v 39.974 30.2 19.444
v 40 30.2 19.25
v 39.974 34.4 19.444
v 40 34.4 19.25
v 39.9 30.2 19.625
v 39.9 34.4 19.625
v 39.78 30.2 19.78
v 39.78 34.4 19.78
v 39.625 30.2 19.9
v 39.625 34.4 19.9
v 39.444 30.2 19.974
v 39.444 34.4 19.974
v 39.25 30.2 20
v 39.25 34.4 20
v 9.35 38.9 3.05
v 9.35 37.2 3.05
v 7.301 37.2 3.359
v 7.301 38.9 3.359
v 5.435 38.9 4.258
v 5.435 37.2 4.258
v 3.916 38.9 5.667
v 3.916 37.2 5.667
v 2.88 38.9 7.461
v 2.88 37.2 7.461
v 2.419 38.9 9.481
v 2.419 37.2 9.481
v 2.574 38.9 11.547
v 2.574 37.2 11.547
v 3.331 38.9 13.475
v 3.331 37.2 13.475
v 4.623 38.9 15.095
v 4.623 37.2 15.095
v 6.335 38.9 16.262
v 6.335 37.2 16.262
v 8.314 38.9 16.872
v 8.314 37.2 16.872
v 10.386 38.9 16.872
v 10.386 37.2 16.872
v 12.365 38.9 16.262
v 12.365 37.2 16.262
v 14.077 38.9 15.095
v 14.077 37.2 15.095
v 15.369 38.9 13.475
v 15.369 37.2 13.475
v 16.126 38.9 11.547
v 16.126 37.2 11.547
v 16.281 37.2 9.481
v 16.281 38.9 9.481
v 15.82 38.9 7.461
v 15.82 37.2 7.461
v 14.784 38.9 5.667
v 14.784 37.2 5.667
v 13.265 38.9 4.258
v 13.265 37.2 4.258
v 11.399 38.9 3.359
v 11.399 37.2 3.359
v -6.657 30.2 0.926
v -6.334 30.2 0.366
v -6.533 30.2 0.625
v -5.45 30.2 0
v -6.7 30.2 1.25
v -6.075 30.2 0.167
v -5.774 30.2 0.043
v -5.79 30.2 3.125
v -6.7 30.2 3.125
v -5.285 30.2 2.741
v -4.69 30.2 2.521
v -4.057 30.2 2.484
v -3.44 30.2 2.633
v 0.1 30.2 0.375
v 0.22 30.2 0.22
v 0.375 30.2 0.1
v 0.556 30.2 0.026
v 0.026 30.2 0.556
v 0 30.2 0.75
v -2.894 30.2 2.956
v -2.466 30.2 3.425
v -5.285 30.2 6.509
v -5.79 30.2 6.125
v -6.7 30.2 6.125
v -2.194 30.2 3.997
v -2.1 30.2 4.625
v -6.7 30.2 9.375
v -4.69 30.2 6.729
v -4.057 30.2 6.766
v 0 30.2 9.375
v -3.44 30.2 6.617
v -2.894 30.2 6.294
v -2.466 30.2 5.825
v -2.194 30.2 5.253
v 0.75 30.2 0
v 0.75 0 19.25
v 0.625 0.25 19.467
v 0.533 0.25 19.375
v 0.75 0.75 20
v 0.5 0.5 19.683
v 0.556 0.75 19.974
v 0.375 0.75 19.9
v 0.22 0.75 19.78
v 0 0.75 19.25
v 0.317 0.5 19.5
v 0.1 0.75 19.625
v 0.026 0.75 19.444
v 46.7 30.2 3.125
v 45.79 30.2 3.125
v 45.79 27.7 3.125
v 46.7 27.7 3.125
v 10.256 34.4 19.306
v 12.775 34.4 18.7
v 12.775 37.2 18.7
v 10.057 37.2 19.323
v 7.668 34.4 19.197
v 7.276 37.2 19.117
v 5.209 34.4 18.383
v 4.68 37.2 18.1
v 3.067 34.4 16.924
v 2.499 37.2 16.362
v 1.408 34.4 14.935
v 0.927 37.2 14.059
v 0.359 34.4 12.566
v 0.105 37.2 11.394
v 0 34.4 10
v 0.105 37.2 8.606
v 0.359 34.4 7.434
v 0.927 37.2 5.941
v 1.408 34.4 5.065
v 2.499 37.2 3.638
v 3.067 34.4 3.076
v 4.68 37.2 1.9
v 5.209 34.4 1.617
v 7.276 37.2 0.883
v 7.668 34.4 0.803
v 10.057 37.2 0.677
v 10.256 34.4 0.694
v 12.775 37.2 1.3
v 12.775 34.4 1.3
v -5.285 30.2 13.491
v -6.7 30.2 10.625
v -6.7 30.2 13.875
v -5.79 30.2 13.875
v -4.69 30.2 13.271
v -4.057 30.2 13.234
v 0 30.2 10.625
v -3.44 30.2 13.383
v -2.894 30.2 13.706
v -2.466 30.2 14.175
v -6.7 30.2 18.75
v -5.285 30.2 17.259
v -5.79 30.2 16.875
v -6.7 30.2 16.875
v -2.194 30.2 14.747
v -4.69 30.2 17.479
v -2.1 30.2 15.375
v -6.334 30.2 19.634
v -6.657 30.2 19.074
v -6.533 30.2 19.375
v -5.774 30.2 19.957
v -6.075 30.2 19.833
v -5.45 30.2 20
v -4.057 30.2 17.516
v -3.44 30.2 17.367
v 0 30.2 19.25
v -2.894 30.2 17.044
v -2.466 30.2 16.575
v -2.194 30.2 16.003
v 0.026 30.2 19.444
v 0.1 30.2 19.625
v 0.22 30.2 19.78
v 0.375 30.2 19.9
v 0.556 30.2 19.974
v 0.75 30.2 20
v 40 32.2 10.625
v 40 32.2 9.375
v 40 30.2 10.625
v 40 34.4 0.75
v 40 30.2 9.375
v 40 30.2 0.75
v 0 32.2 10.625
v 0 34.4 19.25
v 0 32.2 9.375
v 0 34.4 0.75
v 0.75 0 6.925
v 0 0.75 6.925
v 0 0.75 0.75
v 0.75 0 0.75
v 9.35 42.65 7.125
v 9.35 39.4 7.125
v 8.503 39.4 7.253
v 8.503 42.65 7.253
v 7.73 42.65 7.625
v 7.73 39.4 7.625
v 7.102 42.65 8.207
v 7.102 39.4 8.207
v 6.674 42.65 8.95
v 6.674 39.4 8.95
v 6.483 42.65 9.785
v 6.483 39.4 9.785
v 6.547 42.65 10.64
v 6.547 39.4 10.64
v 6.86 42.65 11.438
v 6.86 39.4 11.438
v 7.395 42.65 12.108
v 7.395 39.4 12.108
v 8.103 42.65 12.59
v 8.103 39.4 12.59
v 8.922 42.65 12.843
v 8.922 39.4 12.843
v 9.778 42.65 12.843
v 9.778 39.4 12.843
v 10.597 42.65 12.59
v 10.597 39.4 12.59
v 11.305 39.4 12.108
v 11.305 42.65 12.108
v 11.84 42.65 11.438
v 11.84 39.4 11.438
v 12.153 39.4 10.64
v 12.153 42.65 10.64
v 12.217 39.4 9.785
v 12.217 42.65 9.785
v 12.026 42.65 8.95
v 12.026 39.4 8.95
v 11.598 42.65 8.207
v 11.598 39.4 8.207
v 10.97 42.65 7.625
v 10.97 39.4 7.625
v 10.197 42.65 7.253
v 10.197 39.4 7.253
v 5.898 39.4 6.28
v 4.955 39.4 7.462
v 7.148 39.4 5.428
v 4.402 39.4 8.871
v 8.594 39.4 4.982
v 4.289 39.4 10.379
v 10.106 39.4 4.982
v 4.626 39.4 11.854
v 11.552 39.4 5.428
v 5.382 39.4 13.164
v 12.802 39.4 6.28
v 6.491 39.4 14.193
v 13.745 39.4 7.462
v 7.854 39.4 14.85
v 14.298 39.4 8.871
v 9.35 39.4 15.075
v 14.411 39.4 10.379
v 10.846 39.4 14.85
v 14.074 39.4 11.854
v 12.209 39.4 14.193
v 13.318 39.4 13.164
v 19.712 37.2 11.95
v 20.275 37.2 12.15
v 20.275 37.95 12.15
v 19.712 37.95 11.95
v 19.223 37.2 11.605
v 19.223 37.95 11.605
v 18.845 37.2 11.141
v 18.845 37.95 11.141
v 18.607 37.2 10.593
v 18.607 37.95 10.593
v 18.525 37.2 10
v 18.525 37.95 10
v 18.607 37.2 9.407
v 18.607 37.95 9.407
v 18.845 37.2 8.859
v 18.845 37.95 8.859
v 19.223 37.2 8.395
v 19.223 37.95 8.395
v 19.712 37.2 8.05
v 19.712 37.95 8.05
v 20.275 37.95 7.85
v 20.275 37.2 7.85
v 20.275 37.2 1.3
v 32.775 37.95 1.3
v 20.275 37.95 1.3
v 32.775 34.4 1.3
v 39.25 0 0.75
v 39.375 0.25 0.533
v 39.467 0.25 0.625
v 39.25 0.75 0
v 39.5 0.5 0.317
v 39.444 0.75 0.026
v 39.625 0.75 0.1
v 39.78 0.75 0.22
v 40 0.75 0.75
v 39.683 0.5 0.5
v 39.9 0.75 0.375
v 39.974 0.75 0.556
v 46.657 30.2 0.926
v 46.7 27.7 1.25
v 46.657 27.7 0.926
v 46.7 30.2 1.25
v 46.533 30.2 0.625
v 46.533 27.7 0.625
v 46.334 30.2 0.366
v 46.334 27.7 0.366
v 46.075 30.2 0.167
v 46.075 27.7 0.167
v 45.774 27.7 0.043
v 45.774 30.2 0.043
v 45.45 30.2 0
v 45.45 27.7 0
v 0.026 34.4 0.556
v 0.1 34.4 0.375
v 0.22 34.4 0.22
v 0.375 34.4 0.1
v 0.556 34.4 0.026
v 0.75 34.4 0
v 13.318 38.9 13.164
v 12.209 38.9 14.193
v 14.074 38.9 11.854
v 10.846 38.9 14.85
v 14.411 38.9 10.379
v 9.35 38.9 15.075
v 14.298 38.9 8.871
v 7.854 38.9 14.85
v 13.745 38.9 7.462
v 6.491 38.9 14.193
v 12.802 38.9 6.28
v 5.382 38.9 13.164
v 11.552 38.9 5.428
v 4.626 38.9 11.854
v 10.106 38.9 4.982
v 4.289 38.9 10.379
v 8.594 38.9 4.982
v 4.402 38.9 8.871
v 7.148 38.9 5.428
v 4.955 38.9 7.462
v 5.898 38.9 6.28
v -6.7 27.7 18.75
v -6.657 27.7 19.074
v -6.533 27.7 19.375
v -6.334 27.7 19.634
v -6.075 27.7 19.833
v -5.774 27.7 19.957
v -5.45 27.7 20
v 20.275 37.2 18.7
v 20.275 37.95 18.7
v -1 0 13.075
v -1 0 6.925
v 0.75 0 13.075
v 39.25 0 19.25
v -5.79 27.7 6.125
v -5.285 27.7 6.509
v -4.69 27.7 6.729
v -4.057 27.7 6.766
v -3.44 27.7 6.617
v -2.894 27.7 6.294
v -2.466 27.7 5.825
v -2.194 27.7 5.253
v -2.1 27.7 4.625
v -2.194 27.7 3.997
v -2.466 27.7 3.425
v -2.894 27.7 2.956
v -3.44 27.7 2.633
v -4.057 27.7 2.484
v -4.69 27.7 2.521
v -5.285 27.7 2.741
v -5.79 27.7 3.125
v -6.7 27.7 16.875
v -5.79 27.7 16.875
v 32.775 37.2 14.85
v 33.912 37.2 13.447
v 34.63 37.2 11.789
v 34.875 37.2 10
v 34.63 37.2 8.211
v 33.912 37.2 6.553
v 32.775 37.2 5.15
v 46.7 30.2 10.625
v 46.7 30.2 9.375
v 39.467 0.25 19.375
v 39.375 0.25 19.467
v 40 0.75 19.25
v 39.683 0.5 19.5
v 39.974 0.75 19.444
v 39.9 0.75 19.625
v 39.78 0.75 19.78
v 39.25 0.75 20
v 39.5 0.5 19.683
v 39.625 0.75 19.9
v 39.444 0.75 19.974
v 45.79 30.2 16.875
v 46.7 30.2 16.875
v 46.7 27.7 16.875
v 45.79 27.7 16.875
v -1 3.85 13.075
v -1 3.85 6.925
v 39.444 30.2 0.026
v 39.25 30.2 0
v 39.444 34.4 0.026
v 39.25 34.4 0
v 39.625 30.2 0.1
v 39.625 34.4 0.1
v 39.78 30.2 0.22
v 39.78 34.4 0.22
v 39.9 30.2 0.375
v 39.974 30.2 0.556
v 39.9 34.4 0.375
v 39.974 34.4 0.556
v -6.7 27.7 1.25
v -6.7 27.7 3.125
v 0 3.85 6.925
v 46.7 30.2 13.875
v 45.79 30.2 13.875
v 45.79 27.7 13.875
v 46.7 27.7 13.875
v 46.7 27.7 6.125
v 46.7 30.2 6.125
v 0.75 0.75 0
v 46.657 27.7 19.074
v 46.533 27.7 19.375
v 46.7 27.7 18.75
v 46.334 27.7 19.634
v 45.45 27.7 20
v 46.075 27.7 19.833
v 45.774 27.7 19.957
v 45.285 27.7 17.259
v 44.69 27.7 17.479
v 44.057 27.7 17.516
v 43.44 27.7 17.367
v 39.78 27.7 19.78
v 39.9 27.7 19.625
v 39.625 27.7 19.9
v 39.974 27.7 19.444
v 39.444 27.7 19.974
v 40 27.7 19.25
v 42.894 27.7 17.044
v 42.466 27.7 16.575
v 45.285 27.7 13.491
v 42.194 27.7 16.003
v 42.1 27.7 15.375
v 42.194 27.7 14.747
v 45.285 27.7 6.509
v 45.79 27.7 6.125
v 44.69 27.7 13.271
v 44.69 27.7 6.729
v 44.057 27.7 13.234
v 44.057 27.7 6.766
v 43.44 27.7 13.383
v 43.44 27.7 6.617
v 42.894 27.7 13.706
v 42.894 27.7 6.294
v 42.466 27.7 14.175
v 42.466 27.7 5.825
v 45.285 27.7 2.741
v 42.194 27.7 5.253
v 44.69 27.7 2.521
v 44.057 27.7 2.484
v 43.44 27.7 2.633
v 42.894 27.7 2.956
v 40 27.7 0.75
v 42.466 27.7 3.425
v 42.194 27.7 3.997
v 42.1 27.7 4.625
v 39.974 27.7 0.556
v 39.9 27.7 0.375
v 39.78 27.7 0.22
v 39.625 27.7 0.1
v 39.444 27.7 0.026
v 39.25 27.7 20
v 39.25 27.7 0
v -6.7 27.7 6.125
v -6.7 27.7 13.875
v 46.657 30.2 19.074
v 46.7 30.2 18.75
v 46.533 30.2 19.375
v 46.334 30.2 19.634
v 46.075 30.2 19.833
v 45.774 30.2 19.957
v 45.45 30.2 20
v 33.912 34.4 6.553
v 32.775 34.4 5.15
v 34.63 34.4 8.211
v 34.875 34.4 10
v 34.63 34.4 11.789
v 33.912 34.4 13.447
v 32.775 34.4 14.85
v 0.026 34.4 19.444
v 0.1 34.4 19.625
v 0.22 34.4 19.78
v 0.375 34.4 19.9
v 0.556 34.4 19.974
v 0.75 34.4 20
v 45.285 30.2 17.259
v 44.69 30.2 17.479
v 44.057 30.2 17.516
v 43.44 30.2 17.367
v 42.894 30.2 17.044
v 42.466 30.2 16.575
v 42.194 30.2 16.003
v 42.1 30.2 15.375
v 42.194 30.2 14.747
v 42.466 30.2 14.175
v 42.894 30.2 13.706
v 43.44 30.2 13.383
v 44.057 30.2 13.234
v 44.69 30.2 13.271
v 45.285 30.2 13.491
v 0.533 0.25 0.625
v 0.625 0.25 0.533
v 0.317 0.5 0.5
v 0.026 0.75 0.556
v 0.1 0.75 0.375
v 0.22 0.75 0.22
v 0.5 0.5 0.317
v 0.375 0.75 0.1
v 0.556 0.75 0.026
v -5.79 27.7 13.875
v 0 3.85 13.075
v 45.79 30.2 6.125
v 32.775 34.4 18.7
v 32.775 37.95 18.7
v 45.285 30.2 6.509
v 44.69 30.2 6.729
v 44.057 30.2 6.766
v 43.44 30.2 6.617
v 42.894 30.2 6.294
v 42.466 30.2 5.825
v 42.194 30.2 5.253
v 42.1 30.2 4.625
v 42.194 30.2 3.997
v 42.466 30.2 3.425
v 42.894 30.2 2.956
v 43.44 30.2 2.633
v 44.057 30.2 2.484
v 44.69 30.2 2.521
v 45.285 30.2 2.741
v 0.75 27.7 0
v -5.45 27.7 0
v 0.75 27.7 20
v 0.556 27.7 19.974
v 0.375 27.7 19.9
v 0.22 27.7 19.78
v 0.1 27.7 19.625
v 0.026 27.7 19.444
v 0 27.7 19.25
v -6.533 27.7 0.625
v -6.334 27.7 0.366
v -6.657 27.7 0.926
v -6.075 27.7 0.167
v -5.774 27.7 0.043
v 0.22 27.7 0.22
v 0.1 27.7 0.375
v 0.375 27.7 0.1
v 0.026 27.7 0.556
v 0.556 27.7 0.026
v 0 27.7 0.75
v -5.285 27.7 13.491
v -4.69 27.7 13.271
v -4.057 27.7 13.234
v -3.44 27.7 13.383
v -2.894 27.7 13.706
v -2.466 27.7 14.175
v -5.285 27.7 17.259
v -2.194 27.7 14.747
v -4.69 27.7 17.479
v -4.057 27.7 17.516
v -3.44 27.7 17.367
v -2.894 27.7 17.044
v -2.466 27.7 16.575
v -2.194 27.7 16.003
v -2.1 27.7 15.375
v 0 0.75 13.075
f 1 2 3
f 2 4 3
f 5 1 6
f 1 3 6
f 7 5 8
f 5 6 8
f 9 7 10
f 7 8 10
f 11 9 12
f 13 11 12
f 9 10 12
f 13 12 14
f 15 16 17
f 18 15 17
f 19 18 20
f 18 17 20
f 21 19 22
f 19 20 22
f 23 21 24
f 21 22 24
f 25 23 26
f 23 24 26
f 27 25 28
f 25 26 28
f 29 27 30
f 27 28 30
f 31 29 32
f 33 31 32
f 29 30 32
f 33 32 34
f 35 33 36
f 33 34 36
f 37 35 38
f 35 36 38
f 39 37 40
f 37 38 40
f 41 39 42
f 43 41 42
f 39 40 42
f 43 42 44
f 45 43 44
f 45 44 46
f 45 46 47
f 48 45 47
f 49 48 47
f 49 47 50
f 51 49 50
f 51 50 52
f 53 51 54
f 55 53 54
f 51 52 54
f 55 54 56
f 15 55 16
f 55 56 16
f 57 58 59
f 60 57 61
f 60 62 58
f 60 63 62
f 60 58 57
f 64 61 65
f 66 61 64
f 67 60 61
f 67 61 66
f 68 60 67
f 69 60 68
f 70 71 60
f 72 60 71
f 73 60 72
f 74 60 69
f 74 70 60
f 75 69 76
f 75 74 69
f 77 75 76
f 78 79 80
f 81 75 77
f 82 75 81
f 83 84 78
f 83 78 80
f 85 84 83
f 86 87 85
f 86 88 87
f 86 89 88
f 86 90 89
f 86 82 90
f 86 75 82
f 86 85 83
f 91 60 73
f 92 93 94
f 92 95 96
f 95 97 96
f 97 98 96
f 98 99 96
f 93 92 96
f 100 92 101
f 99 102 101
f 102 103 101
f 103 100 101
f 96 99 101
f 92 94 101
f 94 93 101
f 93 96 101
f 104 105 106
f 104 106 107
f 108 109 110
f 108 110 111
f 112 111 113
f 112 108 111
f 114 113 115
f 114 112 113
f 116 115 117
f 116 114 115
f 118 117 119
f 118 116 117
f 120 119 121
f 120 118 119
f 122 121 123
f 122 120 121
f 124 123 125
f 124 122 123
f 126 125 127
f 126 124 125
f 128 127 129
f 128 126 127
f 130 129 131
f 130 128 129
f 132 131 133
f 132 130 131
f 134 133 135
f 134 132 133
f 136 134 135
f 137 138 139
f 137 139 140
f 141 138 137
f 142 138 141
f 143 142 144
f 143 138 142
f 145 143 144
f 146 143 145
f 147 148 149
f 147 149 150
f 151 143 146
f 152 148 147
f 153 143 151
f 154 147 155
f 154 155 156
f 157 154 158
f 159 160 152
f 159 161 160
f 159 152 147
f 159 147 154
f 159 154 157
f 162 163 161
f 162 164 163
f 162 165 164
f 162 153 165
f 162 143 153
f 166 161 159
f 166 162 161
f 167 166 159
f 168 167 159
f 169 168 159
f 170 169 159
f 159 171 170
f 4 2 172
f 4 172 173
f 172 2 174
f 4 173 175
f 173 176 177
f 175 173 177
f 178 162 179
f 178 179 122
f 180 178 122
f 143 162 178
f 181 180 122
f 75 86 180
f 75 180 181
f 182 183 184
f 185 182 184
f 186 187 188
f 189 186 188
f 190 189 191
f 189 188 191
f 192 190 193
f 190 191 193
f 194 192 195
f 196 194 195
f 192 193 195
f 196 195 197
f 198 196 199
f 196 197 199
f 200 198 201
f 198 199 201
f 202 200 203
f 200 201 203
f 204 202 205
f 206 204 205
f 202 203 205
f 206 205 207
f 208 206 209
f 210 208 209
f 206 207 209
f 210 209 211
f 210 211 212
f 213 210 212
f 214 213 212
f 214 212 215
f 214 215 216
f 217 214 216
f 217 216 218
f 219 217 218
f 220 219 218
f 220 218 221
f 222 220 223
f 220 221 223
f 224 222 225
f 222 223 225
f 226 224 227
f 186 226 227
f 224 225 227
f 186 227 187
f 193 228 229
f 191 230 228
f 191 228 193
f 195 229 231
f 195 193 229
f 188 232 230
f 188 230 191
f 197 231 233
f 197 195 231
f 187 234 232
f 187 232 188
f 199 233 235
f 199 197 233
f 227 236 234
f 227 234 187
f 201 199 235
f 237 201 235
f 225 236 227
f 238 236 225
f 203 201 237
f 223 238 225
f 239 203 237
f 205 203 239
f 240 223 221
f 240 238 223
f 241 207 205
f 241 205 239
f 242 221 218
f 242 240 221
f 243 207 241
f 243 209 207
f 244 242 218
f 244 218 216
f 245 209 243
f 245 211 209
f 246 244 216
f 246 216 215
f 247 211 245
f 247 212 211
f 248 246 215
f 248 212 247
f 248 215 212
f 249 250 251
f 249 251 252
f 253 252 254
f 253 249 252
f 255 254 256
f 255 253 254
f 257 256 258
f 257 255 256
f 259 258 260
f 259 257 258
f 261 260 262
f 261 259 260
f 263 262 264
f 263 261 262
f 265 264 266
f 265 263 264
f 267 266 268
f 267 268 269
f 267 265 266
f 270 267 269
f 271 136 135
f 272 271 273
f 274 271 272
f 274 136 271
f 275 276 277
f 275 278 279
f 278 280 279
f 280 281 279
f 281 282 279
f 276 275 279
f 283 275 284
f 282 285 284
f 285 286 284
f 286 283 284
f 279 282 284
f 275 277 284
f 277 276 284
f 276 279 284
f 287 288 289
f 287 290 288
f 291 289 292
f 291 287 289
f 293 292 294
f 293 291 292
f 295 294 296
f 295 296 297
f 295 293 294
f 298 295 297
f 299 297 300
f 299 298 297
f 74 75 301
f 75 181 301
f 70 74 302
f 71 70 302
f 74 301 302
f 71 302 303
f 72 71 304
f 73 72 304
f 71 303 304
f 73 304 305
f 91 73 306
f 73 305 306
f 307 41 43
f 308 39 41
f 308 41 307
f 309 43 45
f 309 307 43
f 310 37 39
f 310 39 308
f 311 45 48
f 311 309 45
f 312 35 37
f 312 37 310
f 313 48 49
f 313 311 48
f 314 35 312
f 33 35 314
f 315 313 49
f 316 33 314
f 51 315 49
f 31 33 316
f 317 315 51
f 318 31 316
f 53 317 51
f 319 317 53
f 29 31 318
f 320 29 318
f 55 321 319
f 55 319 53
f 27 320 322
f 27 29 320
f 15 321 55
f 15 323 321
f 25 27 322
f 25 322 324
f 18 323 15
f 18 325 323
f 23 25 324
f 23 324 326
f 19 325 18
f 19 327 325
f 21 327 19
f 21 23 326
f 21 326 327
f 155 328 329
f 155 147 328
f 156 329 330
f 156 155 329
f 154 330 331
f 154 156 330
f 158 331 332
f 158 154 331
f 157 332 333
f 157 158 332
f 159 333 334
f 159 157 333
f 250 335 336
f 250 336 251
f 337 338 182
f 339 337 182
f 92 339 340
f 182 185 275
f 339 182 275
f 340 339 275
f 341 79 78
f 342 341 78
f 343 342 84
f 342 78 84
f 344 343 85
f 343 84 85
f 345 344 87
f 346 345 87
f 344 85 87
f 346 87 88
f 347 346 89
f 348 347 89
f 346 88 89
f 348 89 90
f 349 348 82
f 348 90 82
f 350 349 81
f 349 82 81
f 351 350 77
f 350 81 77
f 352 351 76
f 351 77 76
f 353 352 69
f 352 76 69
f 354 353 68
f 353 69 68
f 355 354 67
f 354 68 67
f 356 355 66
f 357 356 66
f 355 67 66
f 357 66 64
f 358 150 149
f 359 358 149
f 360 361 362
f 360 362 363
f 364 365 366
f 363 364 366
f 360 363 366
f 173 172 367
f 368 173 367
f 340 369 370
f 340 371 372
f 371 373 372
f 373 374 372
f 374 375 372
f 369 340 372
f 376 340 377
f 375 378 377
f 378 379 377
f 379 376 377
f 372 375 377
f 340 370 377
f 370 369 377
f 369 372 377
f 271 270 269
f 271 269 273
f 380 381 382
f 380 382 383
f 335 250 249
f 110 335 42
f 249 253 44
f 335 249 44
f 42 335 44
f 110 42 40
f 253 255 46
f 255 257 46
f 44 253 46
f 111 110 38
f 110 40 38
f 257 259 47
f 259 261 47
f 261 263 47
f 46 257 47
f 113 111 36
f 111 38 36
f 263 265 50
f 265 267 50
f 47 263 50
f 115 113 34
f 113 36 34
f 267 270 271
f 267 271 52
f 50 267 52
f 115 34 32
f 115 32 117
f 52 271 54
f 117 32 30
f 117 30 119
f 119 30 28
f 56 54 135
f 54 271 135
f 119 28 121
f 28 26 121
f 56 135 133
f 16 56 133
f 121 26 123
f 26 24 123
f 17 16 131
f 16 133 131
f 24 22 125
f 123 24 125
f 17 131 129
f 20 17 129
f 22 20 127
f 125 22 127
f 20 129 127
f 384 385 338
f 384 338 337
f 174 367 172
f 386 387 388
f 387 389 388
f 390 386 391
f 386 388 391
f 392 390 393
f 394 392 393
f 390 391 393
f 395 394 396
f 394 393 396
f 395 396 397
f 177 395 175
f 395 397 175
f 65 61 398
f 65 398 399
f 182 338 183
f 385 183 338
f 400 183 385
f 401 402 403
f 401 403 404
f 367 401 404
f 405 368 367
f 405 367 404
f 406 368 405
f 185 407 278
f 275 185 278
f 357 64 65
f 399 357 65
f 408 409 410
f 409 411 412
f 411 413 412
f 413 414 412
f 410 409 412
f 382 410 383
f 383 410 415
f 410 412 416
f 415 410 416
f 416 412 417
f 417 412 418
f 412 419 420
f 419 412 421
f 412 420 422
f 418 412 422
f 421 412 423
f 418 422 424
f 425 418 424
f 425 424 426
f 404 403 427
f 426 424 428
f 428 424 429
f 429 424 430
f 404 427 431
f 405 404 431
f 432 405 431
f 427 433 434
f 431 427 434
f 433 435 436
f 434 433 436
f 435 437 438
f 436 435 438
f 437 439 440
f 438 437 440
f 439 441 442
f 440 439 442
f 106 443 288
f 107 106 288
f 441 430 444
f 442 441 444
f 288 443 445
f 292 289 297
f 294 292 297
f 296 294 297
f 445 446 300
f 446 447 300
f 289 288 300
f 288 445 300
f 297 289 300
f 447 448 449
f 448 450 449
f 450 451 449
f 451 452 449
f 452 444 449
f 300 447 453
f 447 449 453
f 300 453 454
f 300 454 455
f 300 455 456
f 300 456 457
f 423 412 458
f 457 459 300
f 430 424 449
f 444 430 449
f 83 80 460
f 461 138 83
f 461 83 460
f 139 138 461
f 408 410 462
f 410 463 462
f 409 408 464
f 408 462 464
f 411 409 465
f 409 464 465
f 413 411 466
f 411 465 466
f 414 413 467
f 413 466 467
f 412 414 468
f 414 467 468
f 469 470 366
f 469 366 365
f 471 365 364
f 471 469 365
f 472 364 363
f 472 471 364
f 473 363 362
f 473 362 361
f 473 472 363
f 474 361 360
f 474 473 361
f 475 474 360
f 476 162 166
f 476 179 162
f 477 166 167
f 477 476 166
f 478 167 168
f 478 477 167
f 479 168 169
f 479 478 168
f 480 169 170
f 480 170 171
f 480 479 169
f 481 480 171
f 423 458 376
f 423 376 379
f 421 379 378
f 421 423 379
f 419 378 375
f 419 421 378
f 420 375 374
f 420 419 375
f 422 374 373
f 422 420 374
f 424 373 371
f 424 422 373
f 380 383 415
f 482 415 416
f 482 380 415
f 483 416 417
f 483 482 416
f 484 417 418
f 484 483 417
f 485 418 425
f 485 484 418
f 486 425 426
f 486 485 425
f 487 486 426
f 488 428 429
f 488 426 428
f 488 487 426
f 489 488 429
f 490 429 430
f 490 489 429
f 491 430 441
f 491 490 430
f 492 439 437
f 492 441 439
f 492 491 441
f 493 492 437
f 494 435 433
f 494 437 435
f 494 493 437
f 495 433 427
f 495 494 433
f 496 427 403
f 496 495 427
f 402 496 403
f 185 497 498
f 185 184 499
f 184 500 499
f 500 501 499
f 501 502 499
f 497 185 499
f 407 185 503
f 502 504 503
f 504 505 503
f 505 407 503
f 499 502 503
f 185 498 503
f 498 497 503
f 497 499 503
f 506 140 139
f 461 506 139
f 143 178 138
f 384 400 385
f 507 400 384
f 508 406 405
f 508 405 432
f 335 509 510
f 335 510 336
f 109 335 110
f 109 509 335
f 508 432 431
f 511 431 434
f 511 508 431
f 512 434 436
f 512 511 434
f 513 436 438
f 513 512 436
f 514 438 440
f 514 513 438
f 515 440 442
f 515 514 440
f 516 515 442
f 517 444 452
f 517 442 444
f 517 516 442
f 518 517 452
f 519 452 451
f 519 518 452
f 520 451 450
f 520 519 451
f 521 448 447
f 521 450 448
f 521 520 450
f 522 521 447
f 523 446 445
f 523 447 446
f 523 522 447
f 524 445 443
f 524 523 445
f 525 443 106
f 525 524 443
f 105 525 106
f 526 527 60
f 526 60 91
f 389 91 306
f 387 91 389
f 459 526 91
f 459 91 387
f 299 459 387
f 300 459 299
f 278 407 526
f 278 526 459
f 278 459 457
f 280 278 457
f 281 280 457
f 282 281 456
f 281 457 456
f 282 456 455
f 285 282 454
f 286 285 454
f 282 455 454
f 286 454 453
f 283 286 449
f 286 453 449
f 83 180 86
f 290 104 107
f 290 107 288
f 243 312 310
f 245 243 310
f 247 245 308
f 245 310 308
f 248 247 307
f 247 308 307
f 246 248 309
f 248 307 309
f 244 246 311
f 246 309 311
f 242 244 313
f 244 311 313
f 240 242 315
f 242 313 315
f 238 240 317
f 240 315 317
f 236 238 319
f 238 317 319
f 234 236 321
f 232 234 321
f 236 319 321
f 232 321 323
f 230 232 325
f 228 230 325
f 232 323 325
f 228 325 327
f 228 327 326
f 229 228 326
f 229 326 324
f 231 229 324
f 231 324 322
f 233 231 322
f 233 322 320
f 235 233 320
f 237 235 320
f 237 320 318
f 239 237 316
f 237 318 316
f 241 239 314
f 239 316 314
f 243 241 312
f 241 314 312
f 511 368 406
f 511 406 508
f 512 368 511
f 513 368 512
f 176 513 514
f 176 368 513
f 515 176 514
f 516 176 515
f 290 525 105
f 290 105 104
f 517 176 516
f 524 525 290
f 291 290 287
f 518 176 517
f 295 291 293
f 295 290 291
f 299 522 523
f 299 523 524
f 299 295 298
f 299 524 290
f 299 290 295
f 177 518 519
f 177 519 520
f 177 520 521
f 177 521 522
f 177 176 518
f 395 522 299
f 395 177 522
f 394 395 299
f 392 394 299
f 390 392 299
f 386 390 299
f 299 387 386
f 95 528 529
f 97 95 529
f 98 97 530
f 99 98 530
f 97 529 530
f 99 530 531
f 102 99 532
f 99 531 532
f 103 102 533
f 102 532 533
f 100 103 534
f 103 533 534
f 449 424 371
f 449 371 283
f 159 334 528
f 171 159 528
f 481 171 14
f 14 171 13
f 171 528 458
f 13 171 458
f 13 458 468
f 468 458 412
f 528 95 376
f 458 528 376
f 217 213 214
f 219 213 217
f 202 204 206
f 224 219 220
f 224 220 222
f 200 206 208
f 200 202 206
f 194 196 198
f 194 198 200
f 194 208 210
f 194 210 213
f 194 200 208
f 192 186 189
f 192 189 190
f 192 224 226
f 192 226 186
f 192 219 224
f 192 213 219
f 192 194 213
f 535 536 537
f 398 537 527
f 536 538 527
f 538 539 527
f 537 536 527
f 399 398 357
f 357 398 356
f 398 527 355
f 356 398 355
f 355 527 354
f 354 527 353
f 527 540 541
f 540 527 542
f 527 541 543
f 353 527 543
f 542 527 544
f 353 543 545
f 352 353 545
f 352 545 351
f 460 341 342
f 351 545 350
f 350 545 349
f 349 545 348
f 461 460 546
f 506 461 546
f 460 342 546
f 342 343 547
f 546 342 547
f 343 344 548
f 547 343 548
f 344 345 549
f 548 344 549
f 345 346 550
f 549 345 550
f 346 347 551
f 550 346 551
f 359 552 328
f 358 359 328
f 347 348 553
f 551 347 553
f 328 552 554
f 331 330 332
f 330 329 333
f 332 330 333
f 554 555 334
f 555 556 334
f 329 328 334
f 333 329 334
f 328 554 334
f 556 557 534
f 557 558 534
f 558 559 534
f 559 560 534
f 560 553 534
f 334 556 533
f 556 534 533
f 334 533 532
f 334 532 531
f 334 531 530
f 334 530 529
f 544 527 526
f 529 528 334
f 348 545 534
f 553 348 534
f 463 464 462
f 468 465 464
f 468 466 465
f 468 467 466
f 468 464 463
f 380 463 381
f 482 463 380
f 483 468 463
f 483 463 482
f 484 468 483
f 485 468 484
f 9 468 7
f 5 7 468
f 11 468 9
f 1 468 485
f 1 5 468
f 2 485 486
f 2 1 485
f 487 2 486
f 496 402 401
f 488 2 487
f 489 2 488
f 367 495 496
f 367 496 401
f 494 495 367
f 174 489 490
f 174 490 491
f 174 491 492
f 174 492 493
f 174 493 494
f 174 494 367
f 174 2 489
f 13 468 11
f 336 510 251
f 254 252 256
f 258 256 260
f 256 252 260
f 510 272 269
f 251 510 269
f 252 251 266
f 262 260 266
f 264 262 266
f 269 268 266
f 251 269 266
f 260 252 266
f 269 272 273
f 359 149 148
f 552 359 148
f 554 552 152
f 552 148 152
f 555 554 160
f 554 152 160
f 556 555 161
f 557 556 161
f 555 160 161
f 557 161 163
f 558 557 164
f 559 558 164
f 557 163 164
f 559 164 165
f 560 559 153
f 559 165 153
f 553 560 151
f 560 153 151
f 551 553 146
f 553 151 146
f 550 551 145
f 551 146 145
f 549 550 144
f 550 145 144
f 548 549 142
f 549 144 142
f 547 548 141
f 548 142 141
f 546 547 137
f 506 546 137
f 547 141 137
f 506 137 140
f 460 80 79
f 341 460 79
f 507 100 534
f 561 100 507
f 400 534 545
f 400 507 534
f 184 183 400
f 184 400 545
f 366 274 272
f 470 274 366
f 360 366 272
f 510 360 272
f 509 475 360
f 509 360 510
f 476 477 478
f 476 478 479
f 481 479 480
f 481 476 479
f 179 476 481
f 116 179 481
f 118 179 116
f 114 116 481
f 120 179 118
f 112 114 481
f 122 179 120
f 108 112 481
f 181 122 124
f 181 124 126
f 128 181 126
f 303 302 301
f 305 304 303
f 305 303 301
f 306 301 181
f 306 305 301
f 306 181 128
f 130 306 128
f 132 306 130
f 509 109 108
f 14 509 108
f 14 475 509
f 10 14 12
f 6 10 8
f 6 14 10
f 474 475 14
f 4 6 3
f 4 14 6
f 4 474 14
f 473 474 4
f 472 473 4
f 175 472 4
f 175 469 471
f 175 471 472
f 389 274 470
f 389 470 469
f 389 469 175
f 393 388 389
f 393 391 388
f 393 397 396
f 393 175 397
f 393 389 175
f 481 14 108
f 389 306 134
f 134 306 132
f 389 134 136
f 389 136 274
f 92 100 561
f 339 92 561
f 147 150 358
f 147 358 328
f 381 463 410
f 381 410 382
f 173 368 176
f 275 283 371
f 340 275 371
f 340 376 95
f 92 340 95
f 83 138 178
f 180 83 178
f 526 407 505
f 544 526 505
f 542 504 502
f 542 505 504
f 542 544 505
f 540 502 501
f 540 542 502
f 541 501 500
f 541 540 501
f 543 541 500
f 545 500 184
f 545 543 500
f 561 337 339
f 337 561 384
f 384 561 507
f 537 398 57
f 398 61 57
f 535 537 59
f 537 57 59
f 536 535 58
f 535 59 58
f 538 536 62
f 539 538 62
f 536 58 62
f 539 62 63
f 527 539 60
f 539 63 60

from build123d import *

# Parameters (mm, degrees)
SKETCH1_W                 = 40
SKETCH1_H                 = 20
BOSS_EXTRUDE1_DEPTH       = 34.4
BOSS_EXTRUDE2_DEPTH       = 2.8
SKETCH4_R                 = 6.95
BOSS_EXTRUDE3_DEPTH       = 1.7
SKETCH5_R                 = 5.075
BOSS_EXTRUDE4_DEPTH       = 0.5
SKETCH6_R                 = 2.875
BOSS_EXTRUDE5_DEPTH       = 3.25
BOSS_EXTRUDE6_DEPTH       = 0.75
SKETCH8_W                 = 20
SKETCH8_H                 = 2.5
BOSS_EXTRUDE7_DEPTH       = 6.7
SKETCH9_W                 = 20
SKETCH9_H                 = 2.5
BOSS_EXTRUDE8_DEPTH       = 6.7
CUT_EXTRUDE1_DEPTH        = 60.10101522
SKETCH11_W                = 6.15
SKETCH11_H                = 3.85
BOSS_EXTRUDE9_DEPTH       = 1
FILLET1_R                 = 0.75
FILLET2_R                 = 1.25
CHAMFER1_SIZE             = 0.75
BOSS_EXTRUDE10_DEPTH      = 0.625
BOSS_EXTRUDE10_DEPTH_BACK = 0.625


with BuildPart() as part:
    # Sketch1 → Boss-Extrude1 (new body)
    with BuildSketch(Plane(origin=(0, 0, 0), x_dir=(1, 0, 0), z_dir=(0, 1, 0))):
        with Locations((20, -10)):
            Rectangle(SKETCH1_W, SKETCH1_H)
    extrude(amount=BOSS_EXTRUDE1_DEPTH)

    # Sketch3 → Boss-Extrude2 (add)
    with BuildSketch(Plane(origin=(0, 34.4, 0), x_dir=(1, 0, 0), z_dir=(0, 1, 0))):
        with BuildLine():
            Line((12.775273712, -1.3), (32.775273712, -1.3))
            Line((32.775273712, -1.3), (32.775273712, -5.15))
            ThreePointArc((32.775273712, -5.15), (34.875273712, -10), (32.775273712, -14.85))
            Line((32.775273712, -14.85), (32.775273712, -18.7))
            Line((32.775273712, -18.7), (12.775273712, -18.7))
            ThreePointArc((12.775273712, -18.7), (0, -10), (12.775273712, -1.3))
        make_face()
    extrude(amount=BOSS_EXTRUDE2_DEPTH)

    # Sketch4 → Boss-Extrude3 (add)
    with BuildSketch(Plane(origin=(0, 37.2, 0), x_dir=(1, 0, 0), z_dir=(0, 1, 0))):
        with Locations(Location((9.35, -10, 0), (0, 0, 90))):
            Circle(SKETCH4_R)
    extrude(amount=BOSS_EXTRUDE3_DEPTH)

    # Sketch5 → Boss-Extrude4 (add)
    with BuildSketch(Plane(origin=(0, 38.9, 0), x_dir=(1, 0, 0), z_dir=(0, 1, 0))):
        with Locations(Location((9.35, -10, 0), (0, 0, 270))):
            Circle(SKETCH5_R)
    extrude(amount=BOSS_EXTRUDE4_DEPTH)

    # Sketch6 → Boss-Extrude5 (add)
    with BuildSketch(Plane(origin=(0, 39.4, 0), x_dir=(1, 0, 0), z_dir=(0, 1, 0))):
        with Locations(Location((9.35, -10, 0), (0, 0, 90))):
            Circle(SKETCH6_R)
    extrude(amount=BOSS_EXTRUDE5_DEPTH)

    # Sketch7 → Boss-Extrude6 (add)
    with BuildSketch(Plane(origin=(0, 37.2, 0), x_dir=(1, 0, 0), z_dir=(0, 1, 0))):
        with BuildLine():
            Line((32.775273712, -1.3), (32.775273712, -18.7))
            Line((32.775273712, -18.7), (20.275273712, -18.7))
            Line((20.275273712, -18.7), (20.275273712, -12.15))
            ThreePointArc((20.275273712, -12.15), (18.525273712, -10), (20.275273712, -7.85))
            Line((20.275273712, -7.85), (20.275273712, -1.3))
            Line((20.275273712, -1.3), (32.775273712, -1.3))
        make_face()
    extrude(amount=BOSS_EXTRUDE6_DEPTH)

    # Sketch8 → Boss-Extrude7 (add)
    with BuildSketch(Plane(origin=(40, 0, 0), x_dir=(0, 0, -1), z_dir=(1, 0, 0))):
        with Locations((-10, 28.95)):
            Rectangle(SKETCH8_W, SKETCH8_H)
    extrude(amount=BOSS_EXTRUDE7_DEPTH)

    # Sketch9 → Boss-Extrude8 (add)
    with BuildSketch(Plane.ZY):
        with Locations((10, 28.95)):
            Rectangle(SKETCH9_W, SKETCH9_H)
    extrude(amount=BOSS_EXTRUDE8_DEPTH)

    # Sketch10 → Cut-Extrude1 (cut, through all)
    with BuildSketch(Plane(origin=(0, 30.2, 0), x_dir=(1, 0, 0), z_dir=(0, 1, 0))):
        with BuildLine():
            Line((45.79029218, -3.125), (46.7, -3.125))
            Line((46.7, -3.125), (46.7, -6.125))
            Line((46.7, -6.125), (45.79029218, -6.125))
            ThreePointArc((45.79029218, -6.125), (42.1, -4.625), (45.79029218, -3.125))
        make_face()
        with BuildLine():
            Line((45.79029218, -13.875), (46.7, -13.875))
            Line((46.7, -13.875), (46.7, -16.875))
            Line((46.7, -16.875), (45.79029218, -16.875))
            ThreePointArc((45.79029218, -16.875), (42.1, -15.375), (45.79029218, -13.875))
        make_face()
        with BuildLine():
            Line((-5.79029218, -3.125), (-6.7, -3.125))
            Line((-6.7, -3.125), (-6.7, -6.125))
            Line((-6.7, -6.125), (-5.79029218, -6.125))
            ThreePointArc((-5.79029218, -6.125), (-2.1, -4.625), (-5.79029218, -3.125))
        make_face()
        with BuildLine():
            Line((-5.79029218, -13.875), (-6.7, -13.875))
            Line((-6.7, -13.875), (-6.7, -16.875))
            Line((-6.7, -16.875), (-5.79029218, -16.875))
            ThreePointArc((-5.79029218, -16.875), (-2.1, -15.375), (-5.79029218, -13.875))
        make_face()
    extrude(amount=-CUT_EXTRUDE1_DEPTH, mode=Mode.SUBTRACT)

    # Sketch11 → Boss-Extrude9 (add)
    with BuildSketch(Plane.ZY):
        with Locations((10, 1.925)):
            Rectangle(SKETCH11_W, SKETCH11_H)
    extrude(amount=BOSS_EXTRUDE9_DEPTH)

    # Fillet1
    fillet1_edges = [part.edges().sort_by_distance(p)[0] for p in [
        (40, 13.85, 0),
        (40, 13.85, 20),
        (0, 32.3, 0),
        (40, 32.3, 0),
        (40, 32.3, 20),
        (0, 13.85, 0),
        (0, 32.3, 20),
        (0, 13.85, 20),
    ]]
    fillet(fillet1_edges, radius=FILLET1_R)

    # Fillet2
    fillet2_edges = [part.edges().sort_by_distance(p)[0] for p in [
        (46.7, 28.95, 20),
        (46.7, 28.95, 0),
        (-6.7, 28.95, 0),
        (-6.7, 28.95, 20),
    ]]
    fillet(fillet2_edges, radius=FILLET2_R)

    # Chamfer1
    chamfer1_edges = [part.edges().sort_by_distance(p)[0] for p in [
        (0, 0, 16.1625),
        (0, 0, 3.8375),
        (20, 0, 0),
        (40, 0, 10),
        (20, 0, 20),
        (0.219669914, 0, 19.780330086),
        (39.780330086, 0, 19.780330086),
        (39.780330086, 0, 0.219669914),
        (0.219669914, 0, 0.219669914),
    ]]
    chamfer(chamfer1_edges, length=CHAMFER1_SIZE)

    # Sketch12 → Boss-Extrude10 (add, two sides: drawn at the far end of the back side and taken through both)
    with BuildSketch(Plane(origin=(0, 0, 10), x_dir=(-1, 0, 0), z_dir=(0, 0, -1)).offset(-BOSS_EXTRUDE10_DEPTH_BACK)):
        Polygon((-40, 32.2), (-46.7, 30.2), (-40, 30.2), align=None)
        Polygon((6.7, 30.2), (0, 32.2), (0, 30.2), align=None)
    extrude(amount=BOSS_EXTRUDE10_DEPTH + BOSS_EXTRUDE10_DEPTH_BACK)


solid = part.part
